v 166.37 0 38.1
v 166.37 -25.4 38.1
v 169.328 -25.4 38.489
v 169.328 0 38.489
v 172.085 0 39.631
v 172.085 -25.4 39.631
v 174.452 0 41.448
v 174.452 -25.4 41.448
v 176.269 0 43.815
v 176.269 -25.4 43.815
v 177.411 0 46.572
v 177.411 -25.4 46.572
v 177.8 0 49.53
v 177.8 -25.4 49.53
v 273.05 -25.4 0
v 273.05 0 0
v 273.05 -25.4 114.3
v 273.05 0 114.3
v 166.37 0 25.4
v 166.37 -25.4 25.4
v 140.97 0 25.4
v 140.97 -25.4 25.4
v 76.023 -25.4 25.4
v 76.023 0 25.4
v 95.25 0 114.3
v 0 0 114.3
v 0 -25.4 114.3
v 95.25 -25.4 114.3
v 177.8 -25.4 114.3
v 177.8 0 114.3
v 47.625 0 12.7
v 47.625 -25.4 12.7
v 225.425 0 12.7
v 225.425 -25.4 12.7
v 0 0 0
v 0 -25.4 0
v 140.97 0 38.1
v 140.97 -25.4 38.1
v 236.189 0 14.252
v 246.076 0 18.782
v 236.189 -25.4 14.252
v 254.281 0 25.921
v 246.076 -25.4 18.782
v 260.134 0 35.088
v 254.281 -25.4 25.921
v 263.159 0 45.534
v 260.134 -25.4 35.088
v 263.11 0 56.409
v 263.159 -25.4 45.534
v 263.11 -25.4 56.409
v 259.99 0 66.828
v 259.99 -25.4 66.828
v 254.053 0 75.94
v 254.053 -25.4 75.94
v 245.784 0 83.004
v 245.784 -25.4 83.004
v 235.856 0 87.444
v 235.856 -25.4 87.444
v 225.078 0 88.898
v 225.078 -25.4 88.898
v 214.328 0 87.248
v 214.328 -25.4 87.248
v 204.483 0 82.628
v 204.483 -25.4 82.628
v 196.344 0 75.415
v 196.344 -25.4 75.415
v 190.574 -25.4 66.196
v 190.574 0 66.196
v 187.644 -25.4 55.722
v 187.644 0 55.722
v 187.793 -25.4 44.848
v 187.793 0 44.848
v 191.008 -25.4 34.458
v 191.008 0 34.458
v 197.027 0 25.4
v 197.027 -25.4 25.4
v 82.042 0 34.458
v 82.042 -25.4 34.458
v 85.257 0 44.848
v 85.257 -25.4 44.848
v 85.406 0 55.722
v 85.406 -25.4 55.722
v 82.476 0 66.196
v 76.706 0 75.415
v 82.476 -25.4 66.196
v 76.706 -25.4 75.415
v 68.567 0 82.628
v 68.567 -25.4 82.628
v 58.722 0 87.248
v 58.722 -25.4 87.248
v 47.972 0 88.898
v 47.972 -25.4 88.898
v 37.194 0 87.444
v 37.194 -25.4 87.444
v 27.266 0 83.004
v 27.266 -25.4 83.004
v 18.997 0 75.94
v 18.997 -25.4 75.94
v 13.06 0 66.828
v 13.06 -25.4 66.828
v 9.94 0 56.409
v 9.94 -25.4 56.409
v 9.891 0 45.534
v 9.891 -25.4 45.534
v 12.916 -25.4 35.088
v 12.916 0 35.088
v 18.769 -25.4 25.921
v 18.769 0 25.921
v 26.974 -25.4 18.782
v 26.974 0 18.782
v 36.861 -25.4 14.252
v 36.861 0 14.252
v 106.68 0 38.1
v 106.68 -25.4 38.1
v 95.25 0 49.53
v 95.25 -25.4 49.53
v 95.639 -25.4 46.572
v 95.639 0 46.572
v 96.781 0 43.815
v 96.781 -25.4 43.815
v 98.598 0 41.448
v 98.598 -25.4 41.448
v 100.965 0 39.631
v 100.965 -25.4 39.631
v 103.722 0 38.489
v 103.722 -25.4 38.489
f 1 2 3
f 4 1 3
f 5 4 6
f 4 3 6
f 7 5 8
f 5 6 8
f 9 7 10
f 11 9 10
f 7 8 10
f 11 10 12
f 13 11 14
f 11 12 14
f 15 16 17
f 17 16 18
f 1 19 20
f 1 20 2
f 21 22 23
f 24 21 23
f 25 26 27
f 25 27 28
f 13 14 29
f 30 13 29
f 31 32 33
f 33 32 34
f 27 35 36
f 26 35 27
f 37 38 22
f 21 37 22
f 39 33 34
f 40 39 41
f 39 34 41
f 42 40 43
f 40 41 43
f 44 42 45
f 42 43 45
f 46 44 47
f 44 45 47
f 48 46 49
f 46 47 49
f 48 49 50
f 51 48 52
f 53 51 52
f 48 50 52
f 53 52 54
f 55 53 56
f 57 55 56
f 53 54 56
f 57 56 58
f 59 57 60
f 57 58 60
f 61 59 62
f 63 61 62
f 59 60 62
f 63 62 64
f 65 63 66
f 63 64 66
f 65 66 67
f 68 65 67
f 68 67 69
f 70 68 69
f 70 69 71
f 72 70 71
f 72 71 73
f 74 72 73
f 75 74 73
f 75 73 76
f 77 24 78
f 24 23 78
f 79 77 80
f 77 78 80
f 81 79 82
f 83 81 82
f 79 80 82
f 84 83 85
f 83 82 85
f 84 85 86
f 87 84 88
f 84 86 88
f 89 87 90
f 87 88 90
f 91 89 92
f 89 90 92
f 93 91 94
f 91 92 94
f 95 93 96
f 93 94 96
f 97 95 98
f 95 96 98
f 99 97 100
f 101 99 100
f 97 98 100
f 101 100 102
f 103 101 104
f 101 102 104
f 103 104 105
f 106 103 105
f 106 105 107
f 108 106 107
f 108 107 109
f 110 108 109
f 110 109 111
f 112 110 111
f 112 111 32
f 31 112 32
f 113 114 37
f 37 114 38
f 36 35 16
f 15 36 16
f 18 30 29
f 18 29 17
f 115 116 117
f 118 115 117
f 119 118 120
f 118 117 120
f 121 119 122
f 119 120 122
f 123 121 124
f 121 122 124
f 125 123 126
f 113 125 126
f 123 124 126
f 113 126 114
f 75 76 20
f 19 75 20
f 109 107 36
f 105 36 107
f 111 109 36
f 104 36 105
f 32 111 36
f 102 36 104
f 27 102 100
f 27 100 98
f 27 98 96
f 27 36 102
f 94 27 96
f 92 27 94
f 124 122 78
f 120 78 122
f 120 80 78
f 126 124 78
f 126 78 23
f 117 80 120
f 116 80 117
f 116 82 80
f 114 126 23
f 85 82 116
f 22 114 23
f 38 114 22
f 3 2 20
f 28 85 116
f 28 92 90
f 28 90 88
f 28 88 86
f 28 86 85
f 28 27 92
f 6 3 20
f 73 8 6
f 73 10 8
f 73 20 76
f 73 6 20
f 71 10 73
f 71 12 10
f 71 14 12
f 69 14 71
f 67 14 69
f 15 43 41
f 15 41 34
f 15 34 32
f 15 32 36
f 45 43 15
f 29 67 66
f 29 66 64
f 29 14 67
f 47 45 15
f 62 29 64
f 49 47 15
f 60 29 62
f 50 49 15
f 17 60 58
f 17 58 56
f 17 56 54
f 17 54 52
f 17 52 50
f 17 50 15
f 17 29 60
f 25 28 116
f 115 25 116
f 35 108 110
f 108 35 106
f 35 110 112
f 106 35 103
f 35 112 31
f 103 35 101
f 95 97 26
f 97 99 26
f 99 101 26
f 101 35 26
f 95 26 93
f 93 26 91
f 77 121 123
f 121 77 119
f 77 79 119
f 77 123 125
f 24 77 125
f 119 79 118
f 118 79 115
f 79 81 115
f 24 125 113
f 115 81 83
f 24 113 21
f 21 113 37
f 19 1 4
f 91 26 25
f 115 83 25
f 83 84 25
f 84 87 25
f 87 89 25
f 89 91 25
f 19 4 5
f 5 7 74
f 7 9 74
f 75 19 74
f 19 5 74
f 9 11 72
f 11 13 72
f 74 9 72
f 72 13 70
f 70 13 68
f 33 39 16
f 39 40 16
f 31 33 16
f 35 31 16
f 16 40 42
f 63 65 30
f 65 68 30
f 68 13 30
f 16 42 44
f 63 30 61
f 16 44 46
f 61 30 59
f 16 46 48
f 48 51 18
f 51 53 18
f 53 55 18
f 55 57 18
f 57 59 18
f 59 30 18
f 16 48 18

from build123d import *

# Parameters (mm, degrees)
F0_W     = 273.05
F0_H     = 114.3
F1_DEPTH = 25.4
F2_R     = 38.1
F3_DEPTH = 25.4
F5_DEPTH = 25.4
F7_DEPTH = 25.4


with BuildPart() as f1:
    # F0 (on Front) → F1 (new body)
    with BuildSketch(Plane.XZ):
        with Locations((136.525, 57.15)):
            Rectangle(F0_W, F0_H)
    extrude(amount=F1_DEPTH)

    # F2 (on face) → F3 (cut)
    with BuildSketch(Plane.XZ.offset(25.4)):
        with Locations((47.625, 50.8)):
            Circle(F2_R)
        with Locations((225.425, 50.8)):
            Circle(F2_R)
    extrude(amount=-F3_DEPTH, mode=Mode.SUBTRACT)

    # F4 (on face) → F5 (cut)
    with BuildSketch(Plane.XZ.offset(25.4)):
        with BuildLine():
            Line((177.8, 114.3), (95.25, 114.3))
            Line((95.25, 114.3), (95.25, 49.53))
            ThreePointArc((95.25, 49.53), (98.597769, 41.447769), (106.68, 38.1))
            Line((106.68, 38.1), (166.37, 38.1))
            ThreePointArc((166.37, 38.1), (174.452231, 41.447769), (177.8, 49.53))
            Line((177.8, 49.53), (177.8, 114.3))
        make_face()
    extrude(amount=-F5_DEPTH, mode=Mode.SUBTRACT)

    # F6 (on face) → F7 (cut)
    with BuildSketch(Plane.XZ.offset(25.4)):
        Polygon((166.37, 25.4), (166.37, 38.1), (140.97, 38.1), (140.97, 25.4), (76.023063, 25.4), (47.625, 12.7), (166.37, 12.7), align=None)
        Polygon((197.026937, 25.4), (166.37, 25.4), (166.37, 12.7), (225.425, 12.7), align=None)
    extrude(amount=-F7_DEPTH, mode=Mode.SUBTRACT)


solid = f1.part
